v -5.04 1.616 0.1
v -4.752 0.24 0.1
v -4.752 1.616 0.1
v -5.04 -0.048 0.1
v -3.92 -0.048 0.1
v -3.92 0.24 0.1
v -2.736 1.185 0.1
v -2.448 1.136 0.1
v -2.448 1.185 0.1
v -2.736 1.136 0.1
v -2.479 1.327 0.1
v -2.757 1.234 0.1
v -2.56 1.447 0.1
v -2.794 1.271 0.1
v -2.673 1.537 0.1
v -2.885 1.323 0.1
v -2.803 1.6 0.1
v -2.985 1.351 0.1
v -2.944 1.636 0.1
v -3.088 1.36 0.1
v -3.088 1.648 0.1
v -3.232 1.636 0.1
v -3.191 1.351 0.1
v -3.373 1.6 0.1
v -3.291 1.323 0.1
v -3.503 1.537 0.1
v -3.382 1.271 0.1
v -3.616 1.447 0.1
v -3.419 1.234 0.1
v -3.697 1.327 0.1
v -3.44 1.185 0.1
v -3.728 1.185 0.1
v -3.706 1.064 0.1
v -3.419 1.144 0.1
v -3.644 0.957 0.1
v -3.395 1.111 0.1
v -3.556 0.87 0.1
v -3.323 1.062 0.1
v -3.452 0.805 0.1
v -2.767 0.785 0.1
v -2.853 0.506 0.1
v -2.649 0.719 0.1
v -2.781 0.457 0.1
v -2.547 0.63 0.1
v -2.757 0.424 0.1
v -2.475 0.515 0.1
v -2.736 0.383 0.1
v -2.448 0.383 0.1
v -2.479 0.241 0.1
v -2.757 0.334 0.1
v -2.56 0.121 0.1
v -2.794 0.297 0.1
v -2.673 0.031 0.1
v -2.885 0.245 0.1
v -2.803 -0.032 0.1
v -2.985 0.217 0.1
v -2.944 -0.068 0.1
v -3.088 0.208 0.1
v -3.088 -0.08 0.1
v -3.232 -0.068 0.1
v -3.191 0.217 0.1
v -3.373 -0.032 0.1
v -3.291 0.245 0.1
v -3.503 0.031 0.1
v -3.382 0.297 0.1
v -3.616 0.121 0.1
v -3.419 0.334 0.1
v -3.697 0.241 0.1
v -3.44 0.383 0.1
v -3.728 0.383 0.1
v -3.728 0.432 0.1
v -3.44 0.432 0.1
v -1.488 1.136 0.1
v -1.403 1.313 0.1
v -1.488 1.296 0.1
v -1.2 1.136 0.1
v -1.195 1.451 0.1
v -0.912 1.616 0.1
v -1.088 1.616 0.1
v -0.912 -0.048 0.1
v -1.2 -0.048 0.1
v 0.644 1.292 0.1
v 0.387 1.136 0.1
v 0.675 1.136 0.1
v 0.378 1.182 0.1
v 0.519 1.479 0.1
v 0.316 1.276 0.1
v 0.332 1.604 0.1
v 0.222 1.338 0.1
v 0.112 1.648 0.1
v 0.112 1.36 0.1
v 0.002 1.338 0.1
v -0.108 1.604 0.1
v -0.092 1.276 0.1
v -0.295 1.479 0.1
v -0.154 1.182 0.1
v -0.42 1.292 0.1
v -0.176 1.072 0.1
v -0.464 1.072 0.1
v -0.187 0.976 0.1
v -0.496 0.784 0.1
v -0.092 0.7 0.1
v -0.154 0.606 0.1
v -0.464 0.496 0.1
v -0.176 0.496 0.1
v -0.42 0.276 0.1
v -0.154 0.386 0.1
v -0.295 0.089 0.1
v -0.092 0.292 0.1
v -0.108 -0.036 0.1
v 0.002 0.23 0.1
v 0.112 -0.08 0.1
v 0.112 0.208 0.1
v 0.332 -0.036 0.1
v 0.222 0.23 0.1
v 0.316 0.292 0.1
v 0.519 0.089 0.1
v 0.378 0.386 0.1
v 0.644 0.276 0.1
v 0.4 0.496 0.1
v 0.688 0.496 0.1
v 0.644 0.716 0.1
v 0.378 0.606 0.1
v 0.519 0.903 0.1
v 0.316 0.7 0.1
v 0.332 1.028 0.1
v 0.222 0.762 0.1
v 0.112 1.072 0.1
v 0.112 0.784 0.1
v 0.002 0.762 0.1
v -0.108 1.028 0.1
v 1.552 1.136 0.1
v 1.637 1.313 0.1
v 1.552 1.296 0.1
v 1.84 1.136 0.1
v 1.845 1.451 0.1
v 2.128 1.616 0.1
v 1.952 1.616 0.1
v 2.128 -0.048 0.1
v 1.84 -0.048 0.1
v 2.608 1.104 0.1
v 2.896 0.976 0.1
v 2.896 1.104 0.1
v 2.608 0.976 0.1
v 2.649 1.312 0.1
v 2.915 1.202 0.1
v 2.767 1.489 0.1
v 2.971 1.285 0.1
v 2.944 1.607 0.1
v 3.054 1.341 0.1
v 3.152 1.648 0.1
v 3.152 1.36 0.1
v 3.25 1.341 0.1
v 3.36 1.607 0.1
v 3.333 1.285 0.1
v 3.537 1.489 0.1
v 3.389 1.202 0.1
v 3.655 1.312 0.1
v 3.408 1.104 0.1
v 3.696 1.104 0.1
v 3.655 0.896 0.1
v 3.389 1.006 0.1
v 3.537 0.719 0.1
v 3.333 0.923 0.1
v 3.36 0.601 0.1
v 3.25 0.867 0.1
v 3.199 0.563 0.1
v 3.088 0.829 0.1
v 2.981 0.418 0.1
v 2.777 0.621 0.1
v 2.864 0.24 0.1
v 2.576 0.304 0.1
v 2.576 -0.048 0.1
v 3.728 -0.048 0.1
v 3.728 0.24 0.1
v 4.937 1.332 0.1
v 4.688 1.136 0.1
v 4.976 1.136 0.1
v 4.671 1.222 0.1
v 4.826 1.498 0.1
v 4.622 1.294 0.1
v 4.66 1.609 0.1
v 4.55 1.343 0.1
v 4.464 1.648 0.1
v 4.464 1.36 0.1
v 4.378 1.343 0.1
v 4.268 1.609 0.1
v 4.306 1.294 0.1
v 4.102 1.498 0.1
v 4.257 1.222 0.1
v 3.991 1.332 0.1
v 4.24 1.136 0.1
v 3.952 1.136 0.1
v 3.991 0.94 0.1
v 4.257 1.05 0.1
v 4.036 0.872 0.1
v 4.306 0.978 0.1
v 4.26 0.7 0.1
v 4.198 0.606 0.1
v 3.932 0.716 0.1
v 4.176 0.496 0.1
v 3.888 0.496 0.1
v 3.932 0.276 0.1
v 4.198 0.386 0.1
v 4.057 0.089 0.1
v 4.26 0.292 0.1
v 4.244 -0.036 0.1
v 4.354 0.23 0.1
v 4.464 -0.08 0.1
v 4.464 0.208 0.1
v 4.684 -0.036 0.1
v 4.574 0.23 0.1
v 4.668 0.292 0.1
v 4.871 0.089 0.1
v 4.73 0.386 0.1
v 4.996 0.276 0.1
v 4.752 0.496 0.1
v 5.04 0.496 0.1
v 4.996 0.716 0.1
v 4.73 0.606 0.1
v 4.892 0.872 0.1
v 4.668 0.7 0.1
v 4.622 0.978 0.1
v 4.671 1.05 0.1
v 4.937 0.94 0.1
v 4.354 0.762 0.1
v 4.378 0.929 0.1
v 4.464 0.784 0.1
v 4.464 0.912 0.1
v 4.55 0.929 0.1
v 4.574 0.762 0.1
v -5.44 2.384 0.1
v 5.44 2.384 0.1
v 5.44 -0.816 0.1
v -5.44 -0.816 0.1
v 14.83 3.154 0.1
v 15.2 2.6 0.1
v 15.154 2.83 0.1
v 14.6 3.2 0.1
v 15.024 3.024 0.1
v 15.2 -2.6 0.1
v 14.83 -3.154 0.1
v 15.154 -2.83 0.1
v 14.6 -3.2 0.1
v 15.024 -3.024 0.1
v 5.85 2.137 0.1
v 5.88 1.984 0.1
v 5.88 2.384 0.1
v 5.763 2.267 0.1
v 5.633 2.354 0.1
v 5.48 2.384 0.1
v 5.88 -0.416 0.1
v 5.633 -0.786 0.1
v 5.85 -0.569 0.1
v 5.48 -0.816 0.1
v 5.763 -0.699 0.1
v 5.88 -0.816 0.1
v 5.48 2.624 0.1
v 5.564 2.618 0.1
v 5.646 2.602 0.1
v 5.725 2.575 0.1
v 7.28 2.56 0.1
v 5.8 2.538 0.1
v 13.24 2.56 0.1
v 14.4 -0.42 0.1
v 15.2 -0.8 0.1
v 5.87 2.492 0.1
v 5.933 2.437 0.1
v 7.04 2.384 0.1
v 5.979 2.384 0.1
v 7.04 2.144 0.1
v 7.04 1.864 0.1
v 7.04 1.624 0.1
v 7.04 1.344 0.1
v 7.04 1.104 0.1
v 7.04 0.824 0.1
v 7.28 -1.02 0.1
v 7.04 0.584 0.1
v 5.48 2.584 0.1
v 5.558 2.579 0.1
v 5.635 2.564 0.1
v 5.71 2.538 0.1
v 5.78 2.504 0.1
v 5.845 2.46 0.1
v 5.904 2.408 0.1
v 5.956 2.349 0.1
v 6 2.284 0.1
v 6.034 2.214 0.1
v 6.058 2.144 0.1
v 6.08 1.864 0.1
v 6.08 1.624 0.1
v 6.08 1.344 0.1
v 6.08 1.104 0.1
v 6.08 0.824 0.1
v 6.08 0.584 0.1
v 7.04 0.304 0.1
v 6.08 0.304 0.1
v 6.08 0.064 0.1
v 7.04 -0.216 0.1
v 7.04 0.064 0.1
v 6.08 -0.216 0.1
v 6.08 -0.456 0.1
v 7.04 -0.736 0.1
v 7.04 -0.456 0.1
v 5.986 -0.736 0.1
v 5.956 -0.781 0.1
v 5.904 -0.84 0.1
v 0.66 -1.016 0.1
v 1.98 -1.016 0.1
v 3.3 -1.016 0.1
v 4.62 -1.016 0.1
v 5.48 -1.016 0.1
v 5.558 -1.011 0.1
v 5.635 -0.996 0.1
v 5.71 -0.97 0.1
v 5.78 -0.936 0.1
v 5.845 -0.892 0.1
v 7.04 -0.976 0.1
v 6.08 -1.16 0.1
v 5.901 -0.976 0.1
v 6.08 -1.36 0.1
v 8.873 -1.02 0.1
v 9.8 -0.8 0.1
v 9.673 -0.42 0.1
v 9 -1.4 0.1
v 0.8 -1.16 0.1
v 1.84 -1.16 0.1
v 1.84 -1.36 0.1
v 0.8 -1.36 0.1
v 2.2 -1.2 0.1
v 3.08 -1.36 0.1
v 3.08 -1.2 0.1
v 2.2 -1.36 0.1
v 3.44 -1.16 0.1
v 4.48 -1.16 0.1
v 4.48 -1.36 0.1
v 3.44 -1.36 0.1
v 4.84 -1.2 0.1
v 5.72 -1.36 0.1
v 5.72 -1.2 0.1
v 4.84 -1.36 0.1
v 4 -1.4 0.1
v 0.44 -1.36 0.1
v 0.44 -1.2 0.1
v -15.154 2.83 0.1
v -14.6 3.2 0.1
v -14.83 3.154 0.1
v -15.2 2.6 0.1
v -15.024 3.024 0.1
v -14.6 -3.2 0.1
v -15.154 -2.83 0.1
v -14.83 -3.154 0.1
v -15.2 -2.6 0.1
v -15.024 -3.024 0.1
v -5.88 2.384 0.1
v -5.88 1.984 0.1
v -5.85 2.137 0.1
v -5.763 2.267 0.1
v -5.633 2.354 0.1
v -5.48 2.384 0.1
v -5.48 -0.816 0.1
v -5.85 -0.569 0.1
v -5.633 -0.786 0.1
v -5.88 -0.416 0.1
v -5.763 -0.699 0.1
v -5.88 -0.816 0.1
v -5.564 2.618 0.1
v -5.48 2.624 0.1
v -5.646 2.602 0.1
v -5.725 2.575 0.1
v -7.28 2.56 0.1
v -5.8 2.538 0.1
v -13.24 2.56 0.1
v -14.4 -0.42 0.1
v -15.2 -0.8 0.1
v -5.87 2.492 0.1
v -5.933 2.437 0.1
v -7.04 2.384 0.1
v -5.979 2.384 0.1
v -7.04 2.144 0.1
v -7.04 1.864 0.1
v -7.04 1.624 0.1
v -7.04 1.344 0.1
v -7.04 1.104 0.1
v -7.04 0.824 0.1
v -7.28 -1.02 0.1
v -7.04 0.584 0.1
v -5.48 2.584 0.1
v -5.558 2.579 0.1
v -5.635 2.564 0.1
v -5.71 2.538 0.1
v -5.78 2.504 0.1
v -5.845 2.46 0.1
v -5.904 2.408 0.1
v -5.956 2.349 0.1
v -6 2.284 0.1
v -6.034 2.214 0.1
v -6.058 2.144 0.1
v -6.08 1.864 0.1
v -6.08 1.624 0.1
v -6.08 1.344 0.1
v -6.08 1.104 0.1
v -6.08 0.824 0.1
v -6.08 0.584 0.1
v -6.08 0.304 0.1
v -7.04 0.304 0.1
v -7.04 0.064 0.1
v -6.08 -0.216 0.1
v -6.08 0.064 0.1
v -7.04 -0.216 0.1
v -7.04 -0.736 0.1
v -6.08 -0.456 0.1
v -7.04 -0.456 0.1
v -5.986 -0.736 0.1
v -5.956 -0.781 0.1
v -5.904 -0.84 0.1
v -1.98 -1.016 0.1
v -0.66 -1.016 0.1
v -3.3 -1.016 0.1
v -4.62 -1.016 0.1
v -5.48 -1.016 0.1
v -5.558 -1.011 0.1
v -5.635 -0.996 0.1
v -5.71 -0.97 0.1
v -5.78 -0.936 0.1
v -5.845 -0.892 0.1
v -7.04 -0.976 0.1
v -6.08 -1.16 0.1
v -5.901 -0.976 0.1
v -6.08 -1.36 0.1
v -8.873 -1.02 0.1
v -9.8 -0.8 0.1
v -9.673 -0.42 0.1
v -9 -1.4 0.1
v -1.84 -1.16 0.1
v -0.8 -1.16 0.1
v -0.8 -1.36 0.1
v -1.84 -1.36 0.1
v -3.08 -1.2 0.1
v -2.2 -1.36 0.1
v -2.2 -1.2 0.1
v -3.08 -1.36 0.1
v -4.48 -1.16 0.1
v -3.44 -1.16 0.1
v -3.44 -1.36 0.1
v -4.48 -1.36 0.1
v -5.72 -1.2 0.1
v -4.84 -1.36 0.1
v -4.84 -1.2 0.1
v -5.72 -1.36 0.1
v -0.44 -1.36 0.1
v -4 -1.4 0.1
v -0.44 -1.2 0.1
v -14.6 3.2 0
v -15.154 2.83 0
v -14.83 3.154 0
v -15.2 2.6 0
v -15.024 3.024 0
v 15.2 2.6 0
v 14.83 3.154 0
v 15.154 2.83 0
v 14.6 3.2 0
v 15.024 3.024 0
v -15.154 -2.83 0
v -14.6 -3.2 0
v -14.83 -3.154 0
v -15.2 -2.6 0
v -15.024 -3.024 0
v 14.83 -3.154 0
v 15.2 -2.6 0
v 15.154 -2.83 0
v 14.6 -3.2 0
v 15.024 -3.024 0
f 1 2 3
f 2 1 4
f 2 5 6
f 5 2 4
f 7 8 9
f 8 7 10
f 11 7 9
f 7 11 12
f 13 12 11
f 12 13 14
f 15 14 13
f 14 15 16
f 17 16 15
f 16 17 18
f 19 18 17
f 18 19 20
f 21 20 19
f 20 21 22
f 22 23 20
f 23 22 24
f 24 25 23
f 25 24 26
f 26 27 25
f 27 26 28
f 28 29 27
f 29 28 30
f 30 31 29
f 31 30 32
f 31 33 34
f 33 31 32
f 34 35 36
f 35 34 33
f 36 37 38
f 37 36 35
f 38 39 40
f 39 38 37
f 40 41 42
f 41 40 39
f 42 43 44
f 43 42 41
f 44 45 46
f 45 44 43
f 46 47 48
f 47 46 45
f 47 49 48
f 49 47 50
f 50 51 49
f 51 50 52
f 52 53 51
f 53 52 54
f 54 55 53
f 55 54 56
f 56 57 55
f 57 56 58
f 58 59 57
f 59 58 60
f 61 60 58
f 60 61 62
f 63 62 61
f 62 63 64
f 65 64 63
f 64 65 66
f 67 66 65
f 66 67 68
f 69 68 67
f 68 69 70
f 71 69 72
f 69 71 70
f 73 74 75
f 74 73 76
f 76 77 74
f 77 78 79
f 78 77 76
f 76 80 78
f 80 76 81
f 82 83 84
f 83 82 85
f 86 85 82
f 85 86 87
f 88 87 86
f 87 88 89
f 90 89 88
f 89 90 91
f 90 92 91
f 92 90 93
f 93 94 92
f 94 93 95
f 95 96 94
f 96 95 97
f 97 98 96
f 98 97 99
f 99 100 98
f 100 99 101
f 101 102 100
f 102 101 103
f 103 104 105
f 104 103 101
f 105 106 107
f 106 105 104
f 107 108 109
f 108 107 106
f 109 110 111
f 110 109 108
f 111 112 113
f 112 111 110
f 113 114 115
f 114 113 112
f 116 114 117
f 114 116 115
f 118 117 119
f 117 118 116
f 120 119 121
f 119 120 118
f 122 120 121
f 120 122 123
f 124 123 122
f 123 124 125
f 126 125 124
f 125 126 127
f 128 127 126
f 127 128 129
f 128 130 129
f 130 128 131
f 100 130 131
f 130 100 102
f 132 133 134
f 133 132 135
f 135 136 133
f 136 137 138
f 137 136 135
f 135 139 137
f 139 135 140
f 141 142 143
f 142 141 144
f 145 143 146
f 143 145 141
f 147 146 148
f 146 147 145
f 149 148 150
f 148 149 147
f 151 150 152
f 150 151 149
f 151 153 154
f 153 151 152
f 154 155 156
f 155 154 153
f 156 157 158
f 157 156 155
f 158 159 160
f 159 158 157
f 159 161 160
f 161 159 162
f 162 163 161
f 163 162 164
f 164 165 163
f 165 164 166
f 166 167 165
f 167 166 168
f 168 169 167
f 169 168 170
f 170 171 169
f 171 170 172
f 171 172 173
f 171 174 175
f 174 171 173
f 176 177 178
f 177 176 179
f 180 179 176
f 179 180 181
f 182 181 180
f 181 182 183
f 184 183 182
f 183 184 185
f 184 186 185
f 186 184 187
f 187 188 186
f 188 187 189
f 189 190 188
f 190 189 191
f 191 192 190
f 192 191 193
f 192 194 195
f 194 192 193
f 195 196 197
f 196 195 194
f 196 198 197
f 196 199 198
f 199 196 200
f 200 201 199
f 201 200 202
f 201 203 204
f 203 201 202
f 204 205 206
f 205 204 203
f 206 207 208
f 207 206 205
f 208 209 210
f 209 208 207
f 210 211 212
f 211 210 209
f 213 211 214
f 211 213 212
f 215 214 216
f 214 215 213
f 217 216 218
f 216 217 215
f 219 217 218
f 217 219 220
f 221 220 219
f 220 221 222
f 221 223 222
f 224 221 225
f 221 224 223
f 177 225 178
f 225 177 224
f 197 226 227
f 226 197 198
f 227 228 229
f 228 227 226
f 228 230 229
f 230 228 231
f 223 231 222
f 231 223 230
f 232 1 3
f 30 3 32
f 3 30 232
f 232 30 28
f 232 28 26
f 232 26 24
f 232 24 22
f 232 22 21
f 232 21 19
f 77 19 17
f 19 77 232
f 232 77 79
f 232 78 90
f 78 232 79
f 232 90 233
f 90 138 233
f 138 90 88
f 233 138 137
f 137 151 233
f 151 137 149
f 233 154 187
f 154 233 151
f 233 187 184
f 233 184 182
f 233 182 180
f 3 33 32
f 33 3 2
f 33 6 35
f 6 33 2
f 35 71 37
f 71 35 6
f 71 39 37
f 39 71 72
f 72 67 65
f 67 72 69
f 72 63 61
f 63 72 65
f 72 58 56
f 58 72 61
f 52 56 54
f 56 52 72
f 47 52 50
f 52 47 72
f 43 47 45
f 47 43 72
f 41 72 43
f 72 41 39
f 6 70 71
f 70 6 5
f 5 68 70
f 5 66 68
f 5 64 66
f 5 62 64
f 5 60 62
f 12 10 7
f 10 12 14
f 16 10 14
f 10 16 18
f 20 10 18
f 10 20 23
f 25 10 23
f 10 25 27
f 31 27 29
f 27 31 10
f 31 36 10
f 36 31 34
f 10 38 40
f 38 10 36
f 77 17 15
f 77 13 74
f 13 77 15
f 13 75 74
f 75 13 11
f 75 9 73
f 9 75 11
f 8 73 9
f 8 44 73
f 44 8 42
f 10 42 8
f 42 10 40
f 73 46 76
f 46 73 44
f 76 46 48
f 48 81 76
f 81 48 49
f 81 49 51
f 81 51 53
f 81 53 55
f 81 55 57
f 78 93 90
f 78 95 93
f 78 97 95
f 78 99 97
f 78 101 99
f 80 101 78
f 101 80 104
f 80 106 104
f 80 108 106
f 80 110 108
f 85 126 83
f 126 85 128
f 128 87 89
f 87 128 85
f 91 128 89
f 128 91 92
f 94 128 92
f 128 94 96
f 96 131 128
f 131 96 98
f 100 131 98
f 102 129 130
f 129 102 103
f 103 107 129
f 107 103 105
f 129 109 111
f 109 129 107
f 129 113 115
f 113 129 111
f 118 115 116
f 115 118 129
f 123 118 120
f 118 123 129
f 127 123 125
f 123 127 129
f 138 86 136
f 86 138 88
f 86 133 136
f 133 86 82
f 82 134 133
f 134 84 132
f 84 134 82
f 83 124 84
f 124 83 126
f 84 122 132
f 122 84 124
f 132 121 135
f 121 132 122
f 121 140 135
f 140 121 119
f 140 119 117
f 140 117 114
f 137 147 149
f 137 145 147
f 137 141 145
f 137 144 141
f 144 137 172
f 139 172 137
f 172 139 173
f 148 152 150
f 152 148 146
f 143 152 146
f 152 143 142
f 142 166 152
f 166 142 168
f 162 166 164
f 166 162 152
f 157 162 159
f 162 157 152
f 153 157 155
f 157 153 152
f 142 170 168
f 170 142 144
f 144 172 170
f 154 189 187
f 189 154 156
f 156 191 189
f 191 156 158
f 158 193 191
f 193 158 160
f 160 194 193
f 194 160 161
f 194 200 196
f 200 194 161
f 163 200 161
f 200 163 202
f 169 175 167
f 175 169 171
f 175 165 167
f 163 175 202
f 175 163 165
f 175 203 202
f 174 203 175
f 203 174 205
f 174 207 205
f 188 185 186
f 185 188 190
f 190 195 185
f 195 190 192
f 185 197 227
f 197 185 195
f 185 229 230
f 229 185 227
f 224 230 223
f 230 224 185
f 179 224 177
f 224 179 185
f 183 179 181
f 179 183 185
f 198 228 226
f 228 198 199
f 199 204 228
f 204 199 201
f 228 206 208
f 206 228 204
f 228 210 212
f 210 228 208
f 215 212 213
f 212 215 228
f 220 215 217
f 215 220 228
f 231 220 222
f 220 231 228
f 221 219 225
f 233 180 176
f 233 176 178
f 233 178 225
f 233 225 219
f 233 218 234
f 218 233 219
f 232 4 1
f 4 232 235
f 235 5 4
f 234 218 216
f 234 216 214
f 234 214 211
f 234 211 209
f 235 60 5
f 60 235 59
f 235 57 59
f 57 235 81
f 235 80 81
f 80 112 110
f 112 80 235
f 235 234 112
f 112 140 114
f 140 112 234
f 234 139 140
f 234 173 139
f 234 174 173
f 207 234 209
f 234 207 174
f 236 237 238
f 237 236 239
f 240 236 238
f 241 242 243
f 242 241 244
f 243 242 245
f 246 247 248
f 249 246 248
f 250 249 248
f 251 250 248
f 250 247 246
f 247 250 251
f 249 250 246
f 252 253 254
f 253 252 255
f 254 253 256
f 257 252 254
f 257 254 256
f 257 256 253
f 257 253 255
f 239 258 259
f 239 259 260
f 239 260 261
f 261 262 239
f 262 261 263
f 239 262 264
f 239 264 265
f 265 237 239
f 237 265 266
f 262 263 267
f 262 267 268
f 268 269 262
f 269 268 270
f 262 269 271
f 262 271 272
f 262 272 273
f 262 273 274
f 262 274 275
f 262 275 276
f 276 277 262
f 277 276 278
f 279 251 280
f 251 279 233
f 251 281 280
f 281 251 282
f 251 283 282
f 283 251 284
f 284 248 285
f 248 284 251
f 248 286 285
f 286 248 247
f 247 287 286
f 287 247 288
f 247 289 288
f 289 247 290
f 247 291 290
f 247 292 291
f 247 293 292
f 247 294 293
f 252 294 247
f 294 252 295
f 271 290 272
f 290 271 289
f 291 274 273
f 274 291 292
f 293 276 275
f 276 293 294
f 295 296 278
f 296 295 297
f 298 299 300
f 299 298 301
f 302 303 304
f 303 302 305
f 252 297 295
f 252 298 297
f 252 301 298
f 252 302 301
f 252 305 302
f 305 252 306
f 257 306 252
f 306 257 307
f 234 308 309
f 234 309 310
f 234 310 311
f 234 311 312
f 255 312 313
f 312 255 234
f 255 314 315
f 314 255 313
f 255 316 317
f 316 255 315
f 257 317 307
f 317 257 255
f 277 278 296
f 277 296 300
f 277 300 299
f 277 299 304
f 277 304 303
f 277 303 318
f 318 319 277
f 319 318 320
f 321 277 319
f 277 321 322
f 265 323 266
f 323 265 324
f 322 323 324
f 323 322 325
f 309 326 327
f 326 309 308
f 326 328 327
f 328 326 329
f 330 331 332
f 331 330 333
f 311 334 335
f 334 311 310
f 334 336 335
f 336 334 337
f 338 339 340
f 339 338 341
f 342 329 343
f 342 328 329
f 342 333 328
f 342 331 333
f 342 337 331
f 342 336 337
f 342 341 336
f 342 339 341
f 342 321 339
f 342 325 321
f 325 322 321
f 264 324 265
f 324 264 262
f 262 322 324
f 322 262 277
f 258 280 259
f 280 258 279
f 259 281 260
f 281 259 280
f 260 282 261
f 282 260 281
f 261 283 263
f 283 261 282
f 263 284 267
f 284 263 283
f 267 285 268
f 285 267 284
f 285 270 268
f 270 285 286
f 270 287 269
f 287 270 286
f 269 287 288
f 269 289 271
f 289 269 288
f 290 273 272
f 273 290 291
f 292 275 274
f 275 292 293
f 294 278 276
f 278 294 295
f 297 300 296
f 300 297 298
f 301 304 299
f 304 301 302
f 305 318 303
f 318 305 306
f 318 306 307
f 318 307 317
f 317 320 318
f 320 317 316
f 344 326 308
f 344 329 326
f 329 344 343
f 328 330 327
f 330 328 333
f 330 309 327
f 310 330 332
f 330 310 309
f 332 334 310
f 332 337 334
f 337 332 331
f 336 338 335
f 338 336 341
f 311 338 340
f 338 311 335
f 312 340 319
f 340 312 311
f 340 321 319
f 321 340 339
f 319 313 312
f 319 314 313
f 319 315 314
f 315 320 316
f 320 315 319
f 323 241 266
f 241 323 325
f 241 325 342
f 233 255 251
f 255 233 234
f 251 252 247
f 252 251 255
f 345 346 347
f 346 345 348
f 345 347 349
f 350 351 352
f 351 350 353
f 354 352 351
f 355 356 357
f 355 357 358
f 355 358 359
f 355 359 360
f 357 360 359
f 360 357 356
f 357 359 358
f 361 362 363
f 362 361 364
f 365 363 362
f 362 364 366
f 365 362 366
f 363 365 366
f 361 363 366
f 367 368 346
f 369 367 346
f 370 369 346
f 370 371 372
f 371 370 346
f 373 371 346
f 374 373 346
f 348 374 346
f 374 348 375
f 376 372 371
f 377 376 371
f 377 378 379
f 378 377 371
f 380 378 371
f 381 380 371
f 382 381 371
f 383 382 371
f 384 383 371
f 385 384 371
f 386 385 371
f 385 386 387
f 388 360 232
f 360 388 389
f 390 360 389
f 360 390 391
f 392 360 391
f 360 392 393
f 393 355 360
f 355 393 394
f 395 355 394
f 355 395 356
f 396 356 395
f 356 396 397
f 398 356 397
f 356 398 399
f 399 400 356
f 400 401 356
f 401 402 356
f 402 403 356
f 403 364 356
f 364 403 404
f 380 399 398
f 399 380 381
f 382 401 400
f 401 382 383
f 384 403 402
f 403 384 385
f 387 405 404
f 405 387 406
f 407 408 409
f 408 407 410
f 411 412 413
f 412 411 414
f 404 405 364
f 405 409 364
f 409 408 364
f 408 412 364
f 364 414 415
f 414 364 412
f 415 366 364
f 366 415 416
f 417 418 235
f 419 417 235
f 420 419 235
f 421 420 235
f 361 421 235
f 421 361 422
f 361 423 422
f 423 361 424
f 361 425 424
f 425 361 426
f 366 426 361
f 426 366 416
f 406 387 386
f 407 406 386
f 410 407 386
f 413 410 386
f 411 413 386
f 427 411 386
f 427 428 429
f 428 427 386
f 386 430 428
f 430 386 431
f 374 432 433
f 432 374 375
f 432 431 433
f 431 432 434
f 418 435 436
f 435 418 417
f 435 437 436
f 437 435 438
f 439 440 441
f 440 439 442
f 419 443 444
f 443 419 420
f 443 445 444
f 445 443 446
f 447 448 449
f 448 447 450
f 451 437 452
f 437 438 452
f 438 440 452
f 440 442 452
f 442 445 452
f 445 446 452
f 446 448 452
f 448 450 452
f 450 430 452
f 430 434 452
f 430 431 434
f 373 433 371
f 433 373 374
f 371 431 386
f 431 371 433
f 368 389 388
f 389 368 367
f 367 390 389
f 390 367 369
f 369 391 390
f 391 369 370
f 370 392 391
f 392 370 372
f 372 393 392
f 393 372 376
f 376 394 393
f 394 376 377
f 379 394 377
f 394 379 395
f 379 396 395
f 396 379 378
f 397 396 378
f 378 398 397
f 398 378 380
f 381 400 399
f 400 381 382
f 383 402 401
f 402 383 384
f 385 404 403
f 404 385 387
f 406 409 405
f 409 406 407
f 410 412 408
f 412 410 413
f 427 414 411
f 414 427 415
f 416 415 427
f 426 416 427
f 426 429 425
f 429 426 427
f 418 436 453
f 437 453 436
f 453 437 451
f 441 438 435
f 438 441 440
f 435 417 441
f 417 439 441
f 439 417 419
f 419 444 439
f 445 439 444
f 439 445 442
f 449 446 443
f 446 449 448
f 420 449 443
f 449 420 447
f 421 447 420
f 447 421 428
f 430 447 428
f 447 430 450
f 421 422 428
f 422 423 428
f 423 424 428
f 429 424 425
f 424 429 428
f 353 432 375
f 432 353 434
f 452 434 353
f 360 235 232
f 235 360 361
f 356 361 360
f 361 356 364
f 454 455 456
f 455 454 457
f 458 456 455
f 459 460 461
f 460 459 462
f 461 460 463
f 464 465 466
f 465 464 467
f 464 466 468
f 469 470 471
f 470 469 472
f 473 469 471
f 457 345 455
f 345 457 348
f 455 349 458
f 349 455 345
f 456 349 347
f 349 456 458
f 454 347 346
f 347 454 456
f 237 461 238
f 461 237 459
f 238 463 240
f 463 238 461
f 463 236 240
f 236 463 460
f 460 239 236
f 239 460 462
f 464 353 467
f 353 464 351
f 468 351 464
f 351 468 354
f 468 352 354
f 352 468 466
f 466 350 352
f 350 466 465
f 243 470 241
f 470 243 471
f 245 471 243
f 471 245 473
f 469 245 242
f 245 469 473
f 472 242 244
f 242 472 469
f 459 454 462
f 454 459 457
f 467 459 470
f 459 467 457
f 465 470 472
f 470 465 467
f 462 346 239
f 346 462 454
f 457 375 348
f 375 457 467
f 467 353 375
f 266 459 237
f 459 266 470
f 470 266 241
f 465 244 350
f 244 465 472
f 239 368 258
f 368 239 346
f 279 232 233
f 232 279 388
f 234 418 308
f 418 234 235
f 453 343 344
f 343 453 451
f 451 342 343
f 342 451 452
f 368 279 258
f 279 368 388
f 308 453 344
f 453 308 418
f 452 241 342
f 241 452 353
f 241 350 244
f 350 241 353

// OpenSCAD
// file: ../p/1-4ndis.scad
use <../lib.scad>
function ldraw_lib__1_4ndis() = [
// 0 Disc Negative 0.25
// 0 Name: 1-4ndis.dat
// 0 Author: James Jessiman
// 0 !LDRAW_ORG Primitive UPDATE 2012-01
// 0 !LICENSE Licensed under CC BY 4.0 : see CAreadme.txt
// 
// 0 BFC CERTIFY CCW
  [0,"BFC","CERTIFY"],
  [0,"BFC","CCW"],
// 
// 0 !HISTORY 2002-03-23 [sbliss] Added BFC Statement
// 0 !HISTORY 2002-04-25 [PTadmin] Official Update 2002-02
// 0 !HISTORY 2007-06-22 [PTadmin] Header formatted for Contributor Agreement
// 0 !HISTORY 2008-07-01 [PTadmin] Official Update 2008-01
// 0 !HISTORY 2012-02-16 [Philo] Changed to CCW
// 0 !HISTORY 2012-03-30 [PTadmin] Official Update 2012-01
// 
// 
// 3 16 0.9239 0 0.3827 1 0 0 1 0 1
  [3,16,0.9239,0,0.3827,1,0,0,1,0,1],
// 3 16 0.7071 0 0.7071 0.9239 0 0.3827 1 0 1
  [3,16,0.7071,0,0.7071,0.9239,0,0.3827,1,0,1],
// 3 16 0.3827 0 0.9239 0.7071 0 0.7071 1 0 1
  [3,16,0.3827,0,0.9239,0.7071,0,0.7071,1,0,1],
// 3 16 0 0 1 0.3827 0 0.9239 1 0 1
  [3,16,0,0,1,0.3827,0,0.9239,1,0,1],
];
module ldraw_lib__1_4ndis(step=0, col=false, unit=2/5, alt=false, line=0.2, solid=!$preview)
    makepoly(ldraw_lib__1_4ndis(), step=step, col=col, unit=unit, alt=alt, line=line, solid=solid);
ldraw_lib__1_4ndis(line=0.2);
// file: ../p/1-4cyli.scad
use <../lib.scad>
function ldraw_lib__1_4cyli() = [
// 0 Cylinder 0.25
// 0 Name: 1-4cyli.dat
// 0 Author: James Jessiman
// 0 !LDRAW_ORG Primitive UPDATE 2012-01
// 0 !LICENSE Licensed under CC BY 4.0 : see CAreadme.txt
// 
// 0 BFC CERTIFY CCW
  [0,"BFC","CERTIFY"],
  [0,"BFC","CCW"],
// 
// 0 !HISTORY 2002-03-23 [sbliss] Added BFC statement.
// 0 !HISTORY 2002-04-25 [PTadmin] Official Update 2002-02
// 0 !HISTORY 2007-06-22 [PTadmin] Header formatted for Contributor Agreement
// 0 !HISTORY 2008-07-01 [PTadmin] Official Update 2008-01
// 0 !HISTORY 2012-02-16 [Philo] Changed to CCW
// 0 !HISTORY 2012-03-30 [PTadmin] Official Update 2012-01
// 
// 
// 4 16 1 1 0 0.9239 1 0.3827 0.9239 0 0.3827 1 0 0
  [4,16,1,1,0,0.9239,1,0.3827,0.9239,0,0.3827,1,0,0],
// 5 24 1 0 0 1 1 0 0.9239 0 0.3827 1 0 -1
  [5,24,1,0,0,1,1,0,0.9239,0,0.3827,1,0,-1],
// 4 16 0.9239 1 0.3827 0.7071 1 0.7071 0.7071 0 0.7071 0.9239 0 0.3827
  [4,16,0.9239,1,0.3827,0.7071,1,0.7071,0.7071,0,0.7071,0.9239,0,0.3827],
// 5 24 0.9239 0 0.3827 0.9239 1 0.3827 0.7071 0 0.7071 1 0 0
  [5,24,0.9239,0,0.3827,0.9239,1,0.3827,0.7071,0,0.7071,1,0,0],
// 4 16 0.7071 1 0.7071 0.3827 1 0.9239 0.3827 0 0.9239 0.7071 0 0.7071
  [4,16,0.7071,1,0.7071,0.3827,1,0.9239,0.3827,0,0.9239,0.7071,0,0.7071],
// 5 24 0.7071 0 0.7071 0.7071 1 0.7071 0.3827 0 0.9239 0.9239 0 0.3827
  [5,24,0.7071,0,0.7071,0.7071,1,0.7071,0.3827,0,0.9239,0.9239,0,0.3827],
// 4 16 0.3827 1 0.9239 0 1 1 0 0 1 0.3827 0 0.9239
  [4,16,0.3827,1,0.9239,0,1,1,0,0,1,0.3827,0,0.9239],
// 5 24 0.3827 0 0.9239 0.3827 1 0.9239 0 0 1 0.7071 0 0.7071
  [5,24,0.3827,0,0.9239,0.3827,1,0.9239,0,0,1,0.7071,0,0.7071],
// 5 24 0 0 1 0 1 1 0.3827 0 0.9239 -1 0 1
  [5,24,0,0,1,0,1,1,0.3827,0,0.9239,-1,0,1],
];
module ldraw_lib__1_4cyli(step=0, col=false, unit=2/5, alt=false, line=0.2, solid=!$preview)
    makepoly(ldraw_lib__1_4cyli(), step=step, col=col, unit=unit, alt=alt, line=line, solid=solid);
ldraw_lib__1_4cyli(line=0.2);
// file: ../p/1-4chrd.scad
use <../lib.scad>
function ldraw_lib__1_4chrd() = [
// 0 Chord 0.25
// 0 Name: 1-4chrd.dat
// 0 Author: Max Martin Richter [MMR1988]
// 0 !LDRAW_ORG Primitive UPDATE 2023-05
// 0 !LICENSE Licensed under CC BY 4.0 : see CAreadme.txt
// 
// 0 BFC CERTIFY CCW
  [0,"BFC","CERTIFY"],
  [0,"BFC","CCW"],
// 
// 0 !HISTORY 2004-04-22 [PTadmin] Official Update 2004-02
// 0 !HISTORY 2007-10-09 [PTadmin] Header formatted for Contributor Agreement
// 0 !HISTORY 2008-07-01 [PTadmin] Official Update 2008-01
// 0 !HISTORY 2012-08-02 [MMR1988] Re-creation with PrimGen2 and Rectifier
// 0 !HISTORY 2012-08-09 [PTadmin] Official Update 2012-02
// 0 !HISTORY 2023-10-27 [OrionP] Change author to MMR1988 from hafhead
// 0 !HISTORY 2023-10-31 [OrionP] Official Update 2023-05
// 
// 4 16 0.9239 0 0.3827 0.3827 0 0.9239 0 0 1 1 0 0
  [4,16,0.9239,0,0.3827,0.3827,0,0.9239,0,0,1,1,0,0],
// 3 16 0.7071 0 0.7071 0.3827 0 0.9239 0.9239 0 0.3827
  [3,16,0.7071,0,0.7071,0.3827,0,0.9239,0.9239,0,0.3827],
];
module ldraw_lib__1_4chrd(step=0, col=false, unit=2/5, alt=false, line=0.2, solid=!$preview)
    makepoly(ldraw_lib__1_4chrd(), step=step, col=col, unit=unit, alt=alt, line=line, solid=solid);
ldraw_lib__1_4chrd(line=0.2);
// main file
use <../lib.scad>
use <../p/1-4chrd.scad>
use <../p/1-4cyli.scad>
use <s/6141875bs01.scad>
use <s/6141875vs01.scad>
function ldraw_lib__6141875v() = [
// 0 Sticker  0.8 x  1.8 with Black Number Plate "LS 16 128" on White Background
// 0 Name: 6141875v.dat
// 0 Author: Massimo Maso [Sirio]
// 0 !LDRAW_ORG Part UPDATE 2023-06
// 0 !LICENSE Licensed under CC BY 4.0 : see CAreadme.txt
// 
// 0 BFC CERTIFY CCW
  [0,"BFC","CERTIFY"],
  [0,"BFC","CCW"],
// 
// 0 !KEYWORDS Bricklink 75875stk01, Brickowl 53567, F-150, Ford, Raptor
// 0 !KEYWORDS Rebrickable 24760, Set 75875, Speed Champions
// 
// 0 !HISTORY 2023-11-19 [OrionP] Official Update 2023-06
// 
// 
// 0 // Subparts
// 
// 1 16 0 -.25 1.96 .8 0 0 0 1 0 0 0 .8 s\6141875bs01.dat
  [1,16,0,-.25,1.96,.8,0,0,0,1,0,0,0,.8, ldraw_lib__s__6141875bs01()],
// 1 16 0 -.25 0 1 0 0 0 1 0 0 0 1 s\6141875vs01.dat
  [1,16,0,-.25,0,1,0,0,0,1,0,0,0,1, ldraw_lib__s__6141875vs01()],
// 1 16 0 -.25 0 -1 0 0 0 1 0 0 0 1 s\6141875vs01.dat
  [1,16,0,-.25,0,-1,0,0,0,1,0,0,0,1, ldraw_lib__s__6141875vs01()],
// 0 // Primitives
// 1 16 -36.5 0 6.5 -1.5 0 0 0 -1 0 0 0 1.5 1-4chrd.dat
  [1,16,-36.5,0,6.5,-1.5,0,0,0,-1,0,0,0,1.5, ldraw_lib__1_4chrd()],
// 1 16 36.5 0 6.5 1.5 0 0 0 -1 0 0 0 1.5 1-4chrd.dat
  [1,16,36.5,0,6.5,1.5,0,0,0,-1,0,0,0,1.5, ldraw_lib__1_4chrd()],
// 1 16 -36.5 0 -6.5 -1.5 0 0 0 -1 0 0 0 -1.5 1-4chrd.dat
  [1,16,-36.5,0,-6.5,-1.5,0,0,0,-1,0,0,0,-1.5, ldraw_lib__1_4chrd()],
// 1 16 36.5 0 -6.5 1.5 0 0 0 -1 0 0 0 -1.5 1-4chrd.dat
  [1,16,36.5,0,-6.5,1.5,0,0,0,-1,0,0,0,-1.5, ldraw_lib__1_4chrd()],
// 1 16 -36.5 0 6.5 -1.5 0 0 0 -.25 0 0 0 1.5 1-4cyli.dat
  [1,16,-36.5,0,6.5,-1.5,0,0,0,-.25,0,0,0,1.5, ldraw_lib__1_4cyli()],
// 1 16 36.5 0 6.5 1.5 0 0 0 -.25 0 0 0 1.5 1-4cyli.dat
  [1,16,36.5,0,6.5,1.5,0,0,0,-.25,0,0,0,1.5, ldraw_lib__1_4cyli()],
// 1 16 -36.5 0 -6.5 -1.5 0 0 0 -.25 0 0 0 -1.5 1-4cyli.dat
  [1,16,-36.5,0,-6.5,-1.5,0,0,0,-.25,0,0,0,-1.5, ldraw_lib__1_4cyli()],
// 1 16 36.5 0 -6.5 1.5 0 0 0 -.25 0 0 0 -1.5 1-4cyli.dat
  [1,16,36.5,0,-6.5,1.5,0,0,0,-.25,0,0,0,-1.5, ldraw_lib__1_4cyli()],
// 0 // Bottom face
// 4 16 36.5 0 8 38 0 6.5 -38 0 6.5 -36.5 0 8
  [4,16,36.5,0,8,38,0,6.5,-38,0,6.5,-36.5,0,8],
// 4 16 38 0 6.5 38 0 -6.5 -38 0 -6.5 -38 0 6.5
  [4,16,38,0,6.5,38,0,-6.5,-38,0,-6.5,-38,0,6.5],
// 4 16 36.5 0 -8 -36.5 0 -8 -38 0 -6.5 38 0 -6.5
  [4,16,36.5,0,-8,-36.5,0,-8,-38,0,-6.5,38,0,-6.5],
// 0 // Lateral face
// 4 16 -36.5 0 8 -36.5 -.25 8 36.5 -.25 8 36.5 0 8
  [4,16,-36.5,0,8,-36.5,-.25,8,36.5,-.25,8,36.5,0,8],
// 4 16 -38 0 6.5 -38 0 -6.5 -38 -.25 -2 -38 -.25 6.5
  [4,16,-38,0,6.5,-38,0,-6.5,-38,-.25,-2,-38,-.25,6.5],
// 3 16 -38 0 -6.5 -38 -.25 -6.5 -38 -.25 -2
  [3,16,-38,0,-6.5,-38,-.25,-6.5,-38,-.25,-2],
// 4 16 38 0 6.5 38 -.25 6.5 38 -.25 -2 38 0 -6.5
  [4,16,38,0,6.5,38,-.25,6.5,38,-.25,-2,38,0,-6.5],
// 3 16 38 0 -6.5 38 -.25 -2 38 -.25 -6.5
  [3,16,38,0,-6.5,38,-.25,-2,38,-.25,-6.5],
// 4 16 -36.5 0 -8 36.5 0 -8 36.5 -.25 -8 -36.5 -.25 -8
  [4,16,-36.5,0,-8,36.5,0,-8,36.5,-.25,-8,-36.5,-.25,-8],
// 0 // Complemetary top face
// 0 // Black faces
// 4 0 -36.5 -.25 8 -13.7 -.25 6.56 13.7 -.25 6.56 36.5 -.25 8
  [4,0,-36.5,-.25,8,-13.7,-.25,6.56,13.7,-.25,6.56,36.5,-.25,8],
// 4 0 -13.7 -.25 6.46 -13.6 -.25 5.96 13.6 -.25 5.96 13.7 -.25 6.46
  [4,0,-13.7,-.25,6.46,-13.6,-.25,5.96,13.6,-.25,5.96,13.7,-.25,6.46],
// 4 0 -13.6 -.25 -2.04 -1.65 -.25 -2.54 1.65 -.25 -2.54 13.6 -.25 -2.04
  [4,0,-13.6,-.25,-2.04,-1.65,-.25,-2.54,1.65,-.25,-2.54,13.6,-.25,-2.04],
// 4 0 -1.1 -.25 -3 -1.1 -.25 -3.4 1.1 -.25 -3.4 1.1 -.25 -3
  [4,0,-1.1,-.25,-3,-1.1,-.25,-3.4,1.1,-.25,-3.4,1.1,-.25,-3],
// 4 0 -1.1 -.25 -3.4 -10 -.25 -3.5 10 -.25 -3.5 1.1 -.25 -3.4
  [4,0,-1.1,-.25,-3.4,-10,-.25,-3.5,10,-.25,-3.5,1.1,-.25,-3.4],
// 0 // Light grey faces
// 4 71 -13.7 -.25 6.56 -13.7 -.25 6.46 13.7 -.25 6.46 13.7 -.25 6.56
  [4,71,-13.7,-.25,6.56,-13.7,-.25,6.46,13.7,-.25,6.46,13.7,-.25,6.56],
// 4 71 -1.1 -.25 -3 1.1 -.25 -3 1.65 -.25 -2.54 -1.65 -.25 -2.54
  [4,71,-1.1,-.25,-3,1.1,-.25,-3,1.65,-.25,-2.54,-1.65,-.25,-2.54],
// 4 71 -38 -.25 -6.5 38 -.25 -6.5 10 -.25 -3.5 -10 -.25 -3.5
  [4,71,-38,-.25,-6.5,38,-.25,-6.5,10,-.25,-3.5,-10,-.25,-3.5],
// 4 71 -38 -.25 -6.5 -36.5 -.25 -8 36.5 -.25 -8 38 -.25 -6.5
  [4,71,-38,-.25,-6.5,-36.5,-.25,-8,36.5,-.25,-8,38,-.25,-6.5],
];
module ldraw_lib__6141875v(step=0, col=false, unit=2/5, alt=false, line=0.2, solid=!$preview)
    makepoly(ldraw_lib__6141875v(), step=step, col=col, unit=unit, alt=alt, line=line, solid=solid);
ldraw_lib__6141875v(line=0.2);
